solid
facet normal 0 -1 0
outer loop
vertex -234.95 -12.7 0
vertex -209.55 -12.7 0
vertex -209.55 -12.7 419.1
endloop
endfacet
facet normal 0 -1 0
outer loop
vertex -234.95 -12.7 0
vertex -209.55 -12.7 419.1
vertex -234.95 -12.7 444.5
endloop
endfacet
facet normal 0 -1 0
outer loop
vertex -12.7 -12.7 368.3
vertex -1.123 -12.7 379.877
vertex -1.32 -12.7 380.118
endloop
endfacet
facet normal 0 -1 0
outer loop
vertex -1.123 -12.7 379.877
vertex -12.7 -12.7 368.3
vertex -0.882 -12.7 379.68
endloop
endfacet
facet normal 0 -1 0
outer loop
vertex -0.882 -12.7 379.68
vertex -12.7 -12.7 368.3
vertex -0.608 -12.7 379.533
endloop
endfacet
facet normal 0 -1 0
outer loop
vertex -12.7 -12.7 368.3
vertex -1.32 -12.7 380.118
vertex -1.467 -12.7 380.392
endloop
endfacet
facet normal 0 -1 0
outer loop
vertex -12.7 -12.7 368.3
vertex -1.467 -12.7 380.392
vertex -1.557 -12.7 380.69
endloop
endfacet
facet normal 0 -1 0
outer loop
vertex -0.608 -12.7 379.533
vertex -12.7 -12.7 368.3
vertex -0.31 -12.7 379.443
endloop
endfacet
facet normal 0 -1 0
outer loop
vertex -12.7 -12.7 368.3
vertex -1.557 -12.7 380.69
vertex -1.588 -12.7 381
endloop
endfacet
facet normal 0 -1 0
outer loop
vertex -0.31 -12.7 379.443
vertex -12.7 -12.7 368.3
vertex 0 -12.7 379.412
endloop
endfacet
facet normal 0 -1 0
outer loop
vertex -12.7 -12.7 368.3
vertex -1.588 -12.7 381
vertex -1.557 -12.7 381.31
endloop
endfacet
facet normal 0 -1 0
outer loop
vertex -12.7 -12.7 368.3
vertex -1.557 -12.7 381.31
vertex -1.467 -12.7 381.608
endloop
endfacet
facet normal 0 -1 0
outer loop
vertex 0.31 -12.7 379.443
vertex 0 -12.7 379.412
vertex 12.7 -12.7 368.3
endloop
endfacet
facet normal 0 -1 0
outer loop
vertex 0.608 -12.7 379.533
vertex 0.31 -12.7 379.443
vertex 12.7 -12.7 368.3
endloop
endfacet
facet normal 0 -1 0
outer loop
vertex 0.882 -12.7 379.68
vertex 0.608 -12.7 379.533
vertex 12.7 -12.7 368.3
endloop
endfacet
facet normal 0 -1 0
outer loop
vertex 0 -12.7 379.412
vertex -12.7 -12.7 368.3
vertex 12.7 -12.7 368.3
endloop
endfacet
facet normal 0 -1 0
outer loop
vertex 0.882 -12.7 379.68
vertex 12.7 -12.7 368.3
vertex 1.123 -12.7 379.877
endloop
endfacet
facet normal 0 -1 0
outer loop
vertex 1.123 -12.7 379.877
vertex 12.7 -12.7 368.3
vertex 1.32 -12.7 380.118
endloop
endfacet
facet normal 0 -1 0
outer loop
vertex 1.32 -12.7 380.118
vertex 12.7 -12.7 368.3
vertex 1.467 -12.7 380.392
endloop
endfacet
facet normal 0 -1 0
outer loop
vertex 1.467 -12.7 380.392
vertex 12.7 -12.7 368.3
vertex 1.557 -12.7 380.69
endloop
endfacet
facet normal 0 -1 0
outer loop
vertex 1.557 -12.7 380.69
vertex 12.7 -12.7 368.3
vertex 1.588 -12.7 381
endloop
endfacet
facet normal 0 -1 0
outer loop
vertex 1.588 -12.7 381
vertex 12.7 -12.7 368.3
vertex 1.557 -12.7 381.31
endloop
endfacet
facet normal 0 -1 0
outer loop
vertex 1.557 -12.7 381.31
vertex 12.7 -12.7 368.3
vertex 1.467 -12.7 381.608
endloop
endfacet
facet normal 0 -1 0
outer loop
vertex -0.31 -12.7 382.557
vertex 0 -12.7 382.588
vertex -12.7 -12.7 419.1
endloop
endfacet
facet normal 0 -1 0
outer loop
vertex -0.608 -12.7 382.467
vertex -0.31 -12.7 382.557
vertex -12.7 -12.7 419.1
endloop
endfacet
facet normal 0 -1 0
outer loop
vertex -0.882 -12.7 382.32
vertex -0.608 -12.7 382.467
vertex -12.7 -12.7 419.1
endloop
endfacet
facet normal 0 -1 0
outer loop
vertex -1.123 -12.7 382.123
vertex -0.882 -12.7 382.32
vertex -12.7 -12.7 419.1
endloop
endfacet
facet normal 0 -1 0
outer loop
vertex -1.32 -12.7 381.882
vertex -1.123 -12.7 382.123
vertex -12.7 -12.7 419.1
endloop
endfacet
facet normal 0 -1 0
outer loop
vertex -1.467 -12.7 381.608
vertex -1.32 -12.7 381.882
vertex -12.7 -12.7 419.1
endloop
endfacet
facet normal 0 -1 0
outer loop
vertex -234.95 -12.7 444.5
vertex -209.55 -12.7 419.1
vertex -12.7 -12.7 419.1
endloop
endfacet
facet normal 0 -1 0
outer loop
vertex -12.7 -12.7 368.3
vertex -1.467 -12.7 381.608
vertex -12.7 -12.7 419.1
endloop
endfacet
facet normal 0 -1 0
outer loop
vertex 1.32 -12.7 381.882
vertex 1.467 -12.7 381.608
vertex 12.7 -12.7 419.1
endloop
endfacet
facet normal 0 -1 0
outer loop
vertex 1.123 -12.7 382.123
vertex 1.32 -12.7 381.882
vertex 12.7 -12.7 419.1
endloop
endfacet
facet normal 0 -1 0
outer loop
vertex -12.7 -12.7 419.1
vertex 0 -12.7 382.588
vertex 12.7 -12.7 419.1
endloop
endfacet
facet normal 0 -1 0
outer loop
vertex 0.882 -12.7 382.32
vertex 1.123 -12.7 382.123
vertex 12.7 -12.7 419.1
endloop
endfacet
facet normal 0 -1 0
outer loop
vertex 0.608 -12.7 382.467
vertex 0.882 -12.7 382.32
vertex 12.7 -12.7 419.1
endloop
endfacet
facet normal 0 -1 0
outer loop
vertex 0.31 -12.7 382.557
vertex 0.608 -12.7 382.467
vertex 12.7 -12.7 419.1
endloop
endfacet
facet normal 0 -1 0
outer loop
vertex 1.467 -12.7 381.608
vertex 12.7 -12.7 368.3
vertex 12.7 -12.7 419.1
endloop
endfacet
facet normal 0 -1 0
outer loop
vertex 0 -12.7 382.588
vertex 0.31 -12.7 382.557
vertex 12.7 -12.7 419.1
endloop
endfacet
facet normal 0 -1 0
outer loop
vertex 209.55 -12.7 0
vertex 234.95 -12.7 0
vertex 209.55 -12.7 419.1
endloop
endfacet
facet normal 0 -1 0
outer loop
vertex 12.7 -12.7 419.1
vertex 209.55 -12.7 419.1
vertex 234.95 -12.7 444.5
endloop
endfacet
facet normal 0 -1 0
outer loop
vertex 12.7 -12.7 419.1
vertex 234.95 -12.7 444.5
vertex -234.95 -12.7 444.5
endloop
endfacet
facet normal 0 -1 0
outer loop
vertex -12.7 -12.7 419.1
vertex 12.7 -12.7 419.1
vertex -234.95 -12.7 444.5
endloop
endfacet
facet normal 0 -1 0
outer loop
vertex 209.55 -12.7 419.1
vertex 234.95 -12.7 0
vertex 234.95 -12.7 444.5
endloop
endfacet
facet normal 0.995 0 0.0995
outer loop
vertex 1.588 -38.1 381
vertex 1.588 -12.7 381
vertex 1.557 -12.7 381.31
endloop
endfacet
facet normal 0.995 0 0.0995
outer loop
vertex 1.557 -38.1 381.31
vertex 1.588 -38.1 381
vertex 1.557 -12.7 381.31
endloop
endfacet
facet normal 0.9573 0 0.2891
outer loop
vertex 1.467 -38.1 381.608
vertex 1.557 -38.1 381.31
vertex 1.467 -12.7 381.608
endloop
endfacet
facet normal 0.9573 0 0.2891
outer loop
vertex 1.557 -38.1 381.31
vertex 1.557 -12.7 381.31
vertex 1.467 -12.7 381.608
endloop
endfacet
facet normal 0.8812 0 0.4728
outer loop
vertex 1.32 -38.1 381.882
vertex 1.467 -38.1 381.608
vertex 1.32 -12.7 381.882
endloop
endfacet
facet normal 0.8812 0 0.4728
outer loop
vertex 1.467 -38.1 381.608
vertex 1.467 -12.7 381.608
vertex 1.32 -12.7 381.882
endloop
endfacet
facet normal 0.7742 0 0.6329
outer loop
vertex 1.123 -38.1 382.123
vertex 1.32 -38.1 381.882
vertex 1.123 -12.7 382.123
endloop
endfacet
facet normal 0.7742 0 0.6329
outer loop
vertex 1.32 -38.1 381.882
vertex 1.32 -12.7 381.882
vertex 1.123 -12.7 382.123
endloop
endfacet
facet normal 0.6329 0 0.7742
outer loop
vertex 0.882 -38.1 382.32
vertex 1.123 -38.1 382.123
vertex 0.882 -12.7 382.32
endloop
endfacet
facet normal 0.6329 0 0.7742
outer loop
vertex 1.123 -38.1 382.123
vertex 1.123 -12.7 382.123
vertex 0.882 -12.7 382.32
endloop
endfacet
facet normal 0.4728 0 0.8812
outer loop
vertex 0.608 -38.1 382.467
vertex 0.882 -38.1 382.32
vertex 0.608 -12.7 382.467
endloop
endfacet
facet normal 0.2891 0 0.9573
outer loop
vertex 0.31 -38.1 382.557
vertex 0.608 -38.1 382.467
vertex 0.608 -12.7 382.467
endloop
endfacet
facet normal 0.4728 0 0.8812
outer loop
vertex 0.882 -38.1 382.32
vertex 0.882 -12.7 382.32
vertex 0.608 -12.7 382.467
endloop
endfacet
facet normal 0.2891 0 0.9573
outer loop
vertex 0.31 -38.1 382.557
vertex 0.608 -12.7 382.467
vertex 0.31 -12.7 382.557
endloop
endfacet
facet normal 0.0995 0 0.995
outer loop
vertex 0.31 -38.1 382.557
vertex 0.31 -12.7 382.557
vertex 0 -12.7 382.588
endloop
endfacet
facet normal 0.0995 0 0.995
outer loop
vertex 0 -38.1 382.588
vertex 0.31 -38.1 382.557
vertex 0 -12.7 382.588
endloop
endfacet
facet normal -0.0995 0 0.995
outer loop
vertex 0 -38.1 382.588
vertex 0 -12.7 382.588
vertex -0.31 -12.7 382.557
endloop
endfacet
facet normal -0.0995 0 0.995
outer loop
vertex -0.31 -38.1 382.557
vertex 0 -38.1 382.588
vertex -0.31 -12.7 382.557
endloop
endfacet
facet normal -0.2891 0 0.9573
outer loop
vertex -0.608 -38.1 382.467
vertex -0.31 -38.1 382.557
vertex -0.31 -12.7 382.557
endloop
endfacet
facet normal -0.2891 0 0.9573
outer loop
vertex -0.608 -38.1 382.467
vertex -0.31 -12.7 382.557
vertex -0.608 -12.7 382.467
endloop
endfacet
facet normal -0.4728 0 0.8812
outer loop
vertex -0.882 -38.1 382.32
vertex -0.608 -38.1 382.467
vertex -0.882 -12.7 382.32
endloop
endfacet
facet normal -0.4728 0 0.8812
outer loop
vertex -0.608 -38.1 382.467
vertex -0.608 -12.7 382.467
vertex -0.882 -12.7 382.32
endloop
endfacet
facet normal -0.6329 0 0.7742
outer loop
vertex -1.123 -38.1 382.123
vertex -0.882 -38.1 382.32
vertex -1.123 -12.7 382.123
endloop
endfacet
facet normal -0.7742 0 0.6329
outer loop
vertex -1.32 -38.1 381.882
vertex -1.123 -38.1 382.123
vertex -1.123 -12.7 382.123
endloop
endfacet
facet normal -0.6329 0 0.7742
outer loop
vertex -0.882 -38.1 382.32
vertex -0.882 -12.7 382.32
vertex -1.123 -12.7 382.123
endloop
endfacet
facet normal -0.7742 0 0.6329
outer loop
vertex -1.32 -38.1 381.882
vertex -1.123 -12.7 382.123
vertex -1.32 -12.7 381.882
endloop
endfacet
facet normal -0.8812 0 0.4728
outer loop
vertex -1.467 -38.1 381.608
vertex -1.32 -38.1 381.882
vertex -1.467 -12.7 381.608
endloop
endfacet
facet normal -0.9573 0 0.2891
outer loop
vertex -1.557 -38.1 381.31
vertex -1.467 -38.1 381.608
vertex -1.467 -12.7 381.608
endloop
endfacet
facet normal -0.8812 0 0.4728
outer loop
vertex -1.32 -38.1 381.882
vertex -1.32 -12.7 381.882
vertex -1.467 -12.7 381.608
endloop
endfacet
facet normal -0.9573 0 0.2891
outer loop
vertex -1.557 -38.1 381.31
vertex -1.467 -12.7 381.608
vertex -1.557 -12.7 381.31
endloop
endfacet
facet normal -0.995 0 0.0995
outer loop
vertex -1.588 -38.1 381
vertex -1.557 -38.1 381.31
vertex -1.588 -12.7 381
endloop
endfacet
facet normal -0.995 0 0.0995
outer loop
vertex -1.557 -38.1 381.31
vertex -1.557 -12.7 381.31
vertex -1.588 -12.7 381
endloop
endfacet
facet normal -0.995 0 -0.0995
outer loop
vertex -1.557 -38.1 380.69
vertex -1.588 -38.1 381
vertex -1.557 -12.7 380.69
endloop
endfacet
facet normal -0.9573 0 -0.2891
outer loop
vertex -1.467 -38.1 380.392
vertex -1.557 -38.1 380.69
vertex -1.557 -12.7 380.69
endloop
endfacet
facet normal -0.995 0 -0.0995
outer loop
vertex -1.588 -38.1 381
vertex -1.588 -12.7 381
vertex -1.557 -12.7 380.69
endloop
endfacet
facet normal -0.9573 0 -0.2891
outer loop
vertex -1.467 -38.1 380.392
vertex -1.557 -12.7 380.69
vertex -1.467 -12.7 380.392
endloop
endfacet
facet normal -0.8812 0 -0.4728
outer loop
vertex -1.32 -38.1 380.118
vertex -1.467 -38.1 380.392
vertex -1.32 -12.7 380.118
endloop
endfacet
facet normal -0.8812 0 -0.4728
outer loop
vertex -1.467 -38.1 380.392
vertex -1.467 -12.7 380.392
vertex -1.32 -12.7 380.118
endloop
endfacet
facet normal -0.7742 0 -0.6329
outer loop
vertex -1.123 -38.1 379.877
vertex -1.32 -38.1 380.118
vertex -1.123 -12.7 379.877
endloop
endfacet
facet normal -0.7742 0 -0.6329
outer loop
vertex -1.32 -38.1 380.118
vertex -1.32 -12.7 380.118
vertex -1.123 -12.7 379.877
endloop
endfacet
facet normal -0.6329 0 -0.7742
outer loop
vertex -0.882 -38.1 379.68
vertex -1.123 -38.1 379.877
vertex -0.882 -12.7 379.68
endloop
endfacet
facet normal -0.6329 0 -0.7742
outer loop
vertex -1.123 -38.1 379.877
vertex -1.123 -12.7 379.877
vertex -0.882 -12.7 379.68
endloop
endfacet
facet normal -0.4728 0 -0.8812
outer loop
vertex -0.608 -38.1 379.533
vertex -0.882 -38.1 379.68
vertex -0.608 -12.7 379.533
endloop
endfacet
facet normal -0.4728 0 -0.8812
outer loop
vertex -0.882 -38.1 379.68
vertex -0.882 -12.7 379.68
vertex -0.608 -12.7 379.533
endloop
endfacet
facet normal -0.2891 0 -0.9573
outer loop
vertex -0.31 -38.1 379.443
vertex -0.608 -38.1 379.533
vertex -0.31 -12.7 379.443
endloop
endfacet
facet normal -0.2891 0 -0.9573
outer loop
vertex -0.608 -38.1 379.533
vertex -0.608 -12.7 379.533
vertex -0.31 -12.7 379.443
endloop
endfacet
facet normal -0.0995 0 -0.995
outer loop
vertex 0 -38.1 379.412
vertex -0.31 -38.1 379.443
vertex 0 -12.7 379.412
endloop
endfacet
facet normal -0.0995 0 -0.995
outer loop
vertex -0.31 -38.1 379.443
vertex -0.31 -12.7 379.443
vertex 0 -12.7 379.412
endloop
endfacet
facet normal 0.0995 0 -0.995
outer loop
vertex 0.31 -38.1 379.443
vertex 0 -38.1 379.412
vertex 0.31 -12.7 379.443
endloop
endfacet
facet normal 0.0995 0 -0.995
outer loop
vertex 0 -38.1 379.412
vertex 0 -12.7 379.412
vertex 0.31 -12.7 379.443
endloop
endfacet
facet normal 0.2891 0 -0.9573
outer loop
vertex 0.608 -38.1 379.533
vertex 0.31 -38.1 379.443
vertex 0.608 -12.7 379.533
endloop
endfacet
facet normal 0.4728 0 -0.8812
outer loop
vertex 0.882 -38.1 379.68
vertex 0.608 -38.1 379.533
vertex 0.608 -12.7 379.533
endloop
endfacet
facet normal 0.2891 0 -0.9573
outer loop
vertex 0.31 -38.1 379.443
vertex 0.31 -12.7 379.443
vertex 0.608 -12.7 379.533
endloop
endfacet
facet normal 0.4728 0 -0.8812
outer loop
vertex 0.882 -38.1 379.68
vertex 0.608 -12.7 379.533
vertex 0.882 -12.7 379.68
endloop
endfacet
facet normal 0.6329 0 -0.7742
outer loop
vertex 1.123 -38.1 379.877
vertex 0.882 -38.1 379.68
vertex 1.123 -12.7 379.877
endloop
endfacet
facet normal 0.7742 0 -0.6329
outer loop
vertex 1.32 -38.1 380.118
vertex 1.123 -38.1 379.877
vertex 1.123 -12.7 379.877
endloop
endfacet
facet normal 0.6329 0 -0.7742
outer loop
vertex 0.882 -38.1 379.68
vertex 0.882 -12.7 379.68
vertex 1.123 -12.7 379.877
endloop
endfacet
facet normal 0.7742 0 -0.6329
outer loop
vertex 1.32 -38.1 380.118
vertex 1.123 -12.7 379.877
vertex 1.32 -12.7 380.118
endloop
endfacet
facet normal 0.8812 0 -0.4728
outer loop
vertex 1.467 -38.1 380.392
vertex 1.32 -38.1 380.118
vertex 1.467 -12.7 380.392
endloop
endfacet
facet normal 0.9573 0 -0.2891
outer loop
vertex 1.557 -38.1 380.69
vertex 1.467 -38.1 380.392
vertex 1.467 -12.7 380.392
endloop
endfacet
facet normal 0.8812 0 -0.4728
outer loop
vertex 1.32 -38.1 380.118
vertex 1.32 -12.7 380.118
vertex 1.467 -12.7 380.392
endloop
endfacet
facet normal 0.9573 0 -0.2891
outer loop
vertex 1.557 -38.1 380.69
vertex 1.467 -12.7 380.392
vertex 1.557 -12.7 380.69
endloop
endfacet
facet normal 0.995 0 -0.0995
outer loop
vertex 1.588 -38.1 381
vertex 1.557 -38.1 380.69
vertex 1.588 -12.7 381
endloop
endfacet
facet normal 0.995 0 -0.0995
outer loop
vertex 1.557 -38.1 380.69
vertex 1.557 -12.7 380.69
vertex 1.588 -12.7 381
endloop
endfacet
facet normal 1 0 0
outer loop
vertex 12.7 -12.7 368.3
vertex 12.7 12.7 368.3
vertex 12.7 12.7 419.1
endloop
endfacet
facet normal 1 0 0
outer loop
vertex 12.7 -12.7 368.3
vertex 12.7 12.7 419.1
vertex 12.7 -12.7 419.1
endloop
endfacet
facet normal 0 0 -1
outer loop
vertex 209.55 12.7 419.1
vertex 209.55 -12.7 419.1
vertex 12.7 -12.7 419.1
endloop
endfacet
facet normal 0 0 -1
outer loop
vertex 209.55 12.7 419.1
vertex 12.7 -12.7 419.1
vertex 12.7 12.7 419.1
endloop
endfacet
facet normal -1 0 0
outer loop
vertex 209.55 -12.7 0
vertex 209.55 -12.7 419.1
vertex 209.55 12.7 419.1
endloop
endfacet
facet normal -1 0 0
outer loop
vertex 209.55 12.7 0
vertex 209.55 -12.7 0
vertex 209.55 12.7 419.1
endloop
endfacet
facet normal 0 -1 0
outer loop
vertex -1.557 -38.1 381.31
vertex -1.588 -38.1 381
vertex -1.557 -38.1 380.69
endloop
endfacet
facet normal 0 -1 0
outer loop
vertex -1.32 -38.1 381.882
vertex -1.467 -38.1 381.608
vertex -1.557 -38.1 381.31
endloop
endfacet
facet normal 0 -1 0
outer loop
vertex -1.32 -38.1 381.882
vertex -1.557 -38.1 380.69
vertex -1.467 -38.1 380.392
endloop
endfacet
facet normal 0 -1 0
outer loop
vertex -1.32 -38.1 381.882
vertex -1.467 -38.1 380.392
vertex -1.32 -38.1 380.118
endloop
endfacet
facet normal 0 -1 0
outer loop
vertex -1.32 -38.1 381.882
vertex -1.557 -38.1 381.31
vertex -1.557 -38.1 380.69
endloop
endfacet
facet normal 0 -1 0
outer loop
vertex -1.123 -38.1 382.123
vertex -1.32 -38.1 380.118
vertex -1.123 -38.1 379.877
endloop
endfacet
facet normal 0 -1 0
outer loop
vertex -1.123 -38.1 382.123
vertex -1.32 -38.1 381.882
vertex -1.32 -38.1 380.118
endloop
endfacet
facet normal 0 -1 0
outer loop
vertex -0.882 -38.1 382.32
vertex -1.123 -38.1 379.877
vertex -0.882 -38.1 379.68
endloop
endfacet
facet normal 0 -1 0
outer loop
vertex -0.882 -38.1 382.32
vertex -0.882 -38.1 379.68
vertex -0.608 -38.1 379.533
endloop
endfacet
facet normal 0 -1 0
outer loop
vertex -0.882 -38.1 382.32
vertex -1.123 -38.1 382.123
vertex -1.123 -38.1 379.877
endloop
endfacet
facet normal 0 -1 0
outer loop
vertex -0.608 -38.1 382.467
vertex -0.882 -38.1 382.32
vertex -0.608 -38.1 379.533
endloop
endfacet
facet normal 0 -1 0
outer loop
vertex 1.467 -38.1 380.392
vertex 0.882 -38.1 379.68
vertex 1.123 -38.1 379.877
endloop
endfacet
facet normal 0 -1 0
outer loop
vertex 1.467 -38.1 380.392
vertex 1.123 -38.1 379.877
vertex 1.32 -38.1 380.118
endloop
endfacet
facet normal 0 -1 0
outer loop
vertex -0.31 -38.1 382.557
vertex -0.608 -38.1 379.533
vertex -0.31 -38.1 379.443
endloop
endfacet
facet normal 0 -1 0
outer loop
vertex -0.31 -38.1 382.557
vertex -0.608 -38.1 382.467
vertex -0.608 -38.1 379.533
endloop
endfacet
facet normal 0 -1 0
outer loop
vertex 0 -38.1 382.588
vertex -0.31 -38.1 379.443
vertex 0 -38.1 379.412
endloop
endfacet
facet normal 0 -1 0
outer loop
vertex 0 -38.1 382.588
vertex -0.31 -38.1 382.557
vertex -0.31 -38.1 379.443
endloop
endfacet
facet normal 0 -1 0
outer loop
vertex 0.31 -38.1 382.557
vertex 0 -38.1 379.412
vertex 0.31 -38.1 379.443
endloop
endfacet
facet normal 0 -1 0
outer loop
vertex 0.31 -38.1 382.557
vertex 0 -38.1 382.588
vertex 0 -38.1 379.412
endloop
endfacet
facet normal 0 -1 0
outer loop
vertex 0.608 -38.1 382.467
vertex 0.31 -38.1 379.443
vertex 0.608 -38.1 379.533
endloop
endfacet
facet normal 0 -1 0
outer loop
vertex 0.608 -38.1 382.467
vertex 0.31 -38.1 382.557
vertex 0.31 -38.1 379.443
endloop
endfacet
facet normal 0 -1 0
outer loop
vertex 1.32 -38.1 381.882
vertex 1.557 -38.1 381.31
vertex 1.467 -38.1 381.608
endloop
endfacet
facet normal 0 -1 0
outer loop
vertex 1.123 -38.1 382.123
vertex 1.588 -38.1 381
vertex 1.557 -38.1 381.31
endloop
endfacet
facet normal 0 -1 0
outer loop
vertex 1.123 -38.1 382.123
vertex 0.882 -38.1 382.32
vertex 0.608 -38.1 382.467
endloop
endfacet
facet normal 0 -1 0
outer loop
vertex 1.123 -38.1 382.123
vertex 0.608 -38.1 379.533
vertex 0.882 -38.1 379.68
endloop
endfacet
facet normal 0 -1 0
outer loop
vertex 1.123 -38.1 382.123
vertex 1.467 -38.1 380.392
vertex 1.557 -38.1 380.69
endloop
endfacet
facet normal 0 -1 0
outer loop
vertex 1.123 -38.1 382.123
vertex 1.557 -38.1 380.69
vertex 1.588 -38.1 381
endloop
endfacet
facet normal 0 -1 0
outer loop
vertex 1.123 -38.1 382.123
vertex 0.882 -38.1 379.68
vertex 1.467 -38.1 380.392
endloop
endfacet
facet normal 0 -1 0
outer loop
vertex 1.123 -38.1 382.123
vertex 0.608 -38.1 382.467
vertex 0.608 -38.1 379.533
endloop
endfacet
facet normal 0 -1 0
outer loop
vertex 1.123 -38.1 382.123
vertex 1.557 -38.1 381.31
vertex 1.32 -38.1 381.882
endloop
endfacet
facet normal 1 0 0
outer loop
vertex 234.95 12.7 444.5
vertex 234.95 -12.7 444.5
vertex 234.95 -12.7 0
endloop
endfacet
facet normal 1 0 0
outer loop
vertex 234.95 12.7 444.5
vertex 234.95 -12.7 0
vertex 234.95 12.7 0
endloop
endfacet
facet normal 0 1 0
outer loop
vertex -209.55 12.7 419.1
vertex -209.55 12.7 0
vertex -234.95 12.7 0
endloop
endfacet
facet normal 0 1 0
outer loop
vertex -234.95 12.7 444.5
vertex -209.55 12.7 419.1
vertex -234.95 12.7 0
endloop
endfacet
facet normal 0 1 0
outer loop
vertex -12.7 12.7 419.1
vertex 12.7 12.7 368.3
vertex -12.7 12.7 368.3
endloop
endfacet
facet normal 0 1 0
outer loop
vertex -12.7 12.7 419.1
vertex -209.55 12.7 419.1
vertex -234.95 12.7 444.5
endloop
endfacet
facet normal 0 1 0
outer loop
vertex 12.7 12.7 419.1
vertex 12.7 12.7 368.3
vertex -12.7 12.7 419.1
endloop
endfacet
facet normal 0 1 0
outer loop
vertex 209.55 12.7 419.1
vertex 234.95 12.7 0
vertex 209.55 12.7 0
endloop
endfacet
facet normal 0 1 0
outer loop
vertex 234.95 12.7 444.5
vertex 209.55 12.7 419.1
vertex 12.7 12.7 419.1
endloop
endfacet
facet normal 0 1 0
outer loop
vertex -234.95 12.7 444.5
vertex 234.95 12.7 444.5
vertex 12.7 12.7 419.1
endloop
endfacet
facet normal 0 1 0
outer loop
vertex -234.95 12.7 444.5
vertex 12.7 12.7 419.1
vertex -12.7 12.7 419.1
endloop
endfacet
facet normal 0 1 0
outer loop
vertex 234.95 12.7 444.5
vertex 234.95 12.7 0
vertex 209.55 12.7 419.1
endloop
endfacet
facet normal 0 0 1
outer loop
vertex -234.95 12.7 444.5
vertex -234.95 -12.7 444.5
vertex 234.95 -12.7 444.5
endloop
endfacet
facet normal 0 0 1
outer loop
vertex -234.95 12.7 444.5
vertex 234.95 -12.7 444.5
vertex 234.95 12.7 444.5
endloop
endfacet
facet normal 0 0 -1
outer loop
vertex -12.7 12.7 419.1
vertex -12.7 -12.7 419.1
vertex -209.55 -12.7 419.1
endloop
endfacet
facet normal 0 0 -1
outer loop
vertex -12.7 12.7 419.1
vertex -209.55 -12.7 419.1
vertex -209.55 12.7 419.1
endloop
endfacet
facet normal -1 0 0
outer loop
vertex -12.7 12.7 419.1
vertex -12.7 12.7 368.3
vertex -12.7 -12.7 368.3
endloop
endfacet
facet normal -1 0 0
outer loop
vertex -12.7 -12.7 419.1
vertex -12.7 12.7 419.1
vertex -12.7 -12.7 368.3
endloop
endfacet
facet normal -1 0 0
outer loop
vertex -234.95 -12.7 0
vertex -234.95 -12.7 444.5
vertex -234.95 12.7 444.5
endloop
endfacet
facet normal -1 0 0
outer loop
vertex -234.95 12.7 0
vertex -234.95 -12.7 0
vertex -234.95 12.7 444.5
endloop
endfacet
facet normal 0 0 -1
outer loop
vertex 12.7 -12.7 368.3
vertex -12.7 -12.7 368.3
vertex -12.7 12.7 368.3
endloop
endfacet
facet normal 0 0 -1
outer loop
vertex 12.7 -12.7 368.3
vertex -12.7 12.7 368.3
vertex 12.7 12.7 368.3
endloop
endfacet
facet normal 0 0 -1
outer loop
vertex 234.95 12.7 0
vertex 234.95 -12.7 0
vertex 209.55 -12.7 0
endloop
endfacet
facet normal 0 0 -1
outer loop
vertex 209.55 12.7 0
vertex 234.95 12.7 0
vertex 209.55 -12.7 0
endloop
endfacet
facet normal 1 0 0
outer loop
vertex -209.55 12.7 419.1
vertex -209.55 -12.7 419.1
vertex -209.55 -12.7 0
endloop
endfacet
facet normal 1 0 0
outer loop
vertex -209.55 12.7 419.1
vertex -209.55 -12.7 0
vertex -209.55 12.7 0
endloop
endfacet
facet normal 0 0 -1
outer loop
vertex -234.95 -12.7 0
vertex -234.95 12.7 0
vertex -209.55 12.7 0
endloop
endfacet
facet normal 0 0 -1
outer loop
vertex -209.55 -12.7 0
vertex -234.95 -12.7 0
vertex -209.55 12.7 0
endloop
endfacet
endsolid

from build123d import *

# Parameters (mm, degrees)
F0_W     = 25.4
F0_H     = 25.4
F1_DEPTH = 444.5
F2_W     = 25.4
F2_H     = 25.4
F3_DEPTH = 209.55
F5_W     = 25.4
F5_H     = 25.4
F6_DEPTH = 50.8
F7_R     = 1.5875
F8_DEPTH = 25.4


with BuildPart() as f1:
    # F0 (on Top) → F1 (new body)
    with BuildSketch(Plane.XY):
        with Locations((-222.25, 0)):
            Rectangle(F0_W, F0_H)
    extrude(amount=F1_DEPTH)

    # F2 (on face) → F3 (join)
    with BuildSketch(Plane.YZ.offset(-209.55)):
        with Locations((0, 431.8)):
            Rectangle(F2_W, F2_H)
    extrude(amount=F3_DEPTH)

    # F4: F1 across plane


with BuildPart() as f1_1:
    add(f1.part)
    add(f1.part.mirror(Plane.YZ))

    # F5 (on face) → F6 (join)
    with BuildSketch(Plane(origin=(0, 0, 419.1), x_dir=(1, 0, 0), z_dir=(0, 0, -1))):
        Rectangle(F5_W, F5_H)
    extrude(amount=F6_DEPTH)

    # F7 (on face) → F8 (join)
    with BuildSketch(Plane.XZ.offset(12.7)):
        with Locations((0, 381)):
            Circle(F7_R)
    extrude(amount=F8_DEPTH)


solid = f1_1.part
